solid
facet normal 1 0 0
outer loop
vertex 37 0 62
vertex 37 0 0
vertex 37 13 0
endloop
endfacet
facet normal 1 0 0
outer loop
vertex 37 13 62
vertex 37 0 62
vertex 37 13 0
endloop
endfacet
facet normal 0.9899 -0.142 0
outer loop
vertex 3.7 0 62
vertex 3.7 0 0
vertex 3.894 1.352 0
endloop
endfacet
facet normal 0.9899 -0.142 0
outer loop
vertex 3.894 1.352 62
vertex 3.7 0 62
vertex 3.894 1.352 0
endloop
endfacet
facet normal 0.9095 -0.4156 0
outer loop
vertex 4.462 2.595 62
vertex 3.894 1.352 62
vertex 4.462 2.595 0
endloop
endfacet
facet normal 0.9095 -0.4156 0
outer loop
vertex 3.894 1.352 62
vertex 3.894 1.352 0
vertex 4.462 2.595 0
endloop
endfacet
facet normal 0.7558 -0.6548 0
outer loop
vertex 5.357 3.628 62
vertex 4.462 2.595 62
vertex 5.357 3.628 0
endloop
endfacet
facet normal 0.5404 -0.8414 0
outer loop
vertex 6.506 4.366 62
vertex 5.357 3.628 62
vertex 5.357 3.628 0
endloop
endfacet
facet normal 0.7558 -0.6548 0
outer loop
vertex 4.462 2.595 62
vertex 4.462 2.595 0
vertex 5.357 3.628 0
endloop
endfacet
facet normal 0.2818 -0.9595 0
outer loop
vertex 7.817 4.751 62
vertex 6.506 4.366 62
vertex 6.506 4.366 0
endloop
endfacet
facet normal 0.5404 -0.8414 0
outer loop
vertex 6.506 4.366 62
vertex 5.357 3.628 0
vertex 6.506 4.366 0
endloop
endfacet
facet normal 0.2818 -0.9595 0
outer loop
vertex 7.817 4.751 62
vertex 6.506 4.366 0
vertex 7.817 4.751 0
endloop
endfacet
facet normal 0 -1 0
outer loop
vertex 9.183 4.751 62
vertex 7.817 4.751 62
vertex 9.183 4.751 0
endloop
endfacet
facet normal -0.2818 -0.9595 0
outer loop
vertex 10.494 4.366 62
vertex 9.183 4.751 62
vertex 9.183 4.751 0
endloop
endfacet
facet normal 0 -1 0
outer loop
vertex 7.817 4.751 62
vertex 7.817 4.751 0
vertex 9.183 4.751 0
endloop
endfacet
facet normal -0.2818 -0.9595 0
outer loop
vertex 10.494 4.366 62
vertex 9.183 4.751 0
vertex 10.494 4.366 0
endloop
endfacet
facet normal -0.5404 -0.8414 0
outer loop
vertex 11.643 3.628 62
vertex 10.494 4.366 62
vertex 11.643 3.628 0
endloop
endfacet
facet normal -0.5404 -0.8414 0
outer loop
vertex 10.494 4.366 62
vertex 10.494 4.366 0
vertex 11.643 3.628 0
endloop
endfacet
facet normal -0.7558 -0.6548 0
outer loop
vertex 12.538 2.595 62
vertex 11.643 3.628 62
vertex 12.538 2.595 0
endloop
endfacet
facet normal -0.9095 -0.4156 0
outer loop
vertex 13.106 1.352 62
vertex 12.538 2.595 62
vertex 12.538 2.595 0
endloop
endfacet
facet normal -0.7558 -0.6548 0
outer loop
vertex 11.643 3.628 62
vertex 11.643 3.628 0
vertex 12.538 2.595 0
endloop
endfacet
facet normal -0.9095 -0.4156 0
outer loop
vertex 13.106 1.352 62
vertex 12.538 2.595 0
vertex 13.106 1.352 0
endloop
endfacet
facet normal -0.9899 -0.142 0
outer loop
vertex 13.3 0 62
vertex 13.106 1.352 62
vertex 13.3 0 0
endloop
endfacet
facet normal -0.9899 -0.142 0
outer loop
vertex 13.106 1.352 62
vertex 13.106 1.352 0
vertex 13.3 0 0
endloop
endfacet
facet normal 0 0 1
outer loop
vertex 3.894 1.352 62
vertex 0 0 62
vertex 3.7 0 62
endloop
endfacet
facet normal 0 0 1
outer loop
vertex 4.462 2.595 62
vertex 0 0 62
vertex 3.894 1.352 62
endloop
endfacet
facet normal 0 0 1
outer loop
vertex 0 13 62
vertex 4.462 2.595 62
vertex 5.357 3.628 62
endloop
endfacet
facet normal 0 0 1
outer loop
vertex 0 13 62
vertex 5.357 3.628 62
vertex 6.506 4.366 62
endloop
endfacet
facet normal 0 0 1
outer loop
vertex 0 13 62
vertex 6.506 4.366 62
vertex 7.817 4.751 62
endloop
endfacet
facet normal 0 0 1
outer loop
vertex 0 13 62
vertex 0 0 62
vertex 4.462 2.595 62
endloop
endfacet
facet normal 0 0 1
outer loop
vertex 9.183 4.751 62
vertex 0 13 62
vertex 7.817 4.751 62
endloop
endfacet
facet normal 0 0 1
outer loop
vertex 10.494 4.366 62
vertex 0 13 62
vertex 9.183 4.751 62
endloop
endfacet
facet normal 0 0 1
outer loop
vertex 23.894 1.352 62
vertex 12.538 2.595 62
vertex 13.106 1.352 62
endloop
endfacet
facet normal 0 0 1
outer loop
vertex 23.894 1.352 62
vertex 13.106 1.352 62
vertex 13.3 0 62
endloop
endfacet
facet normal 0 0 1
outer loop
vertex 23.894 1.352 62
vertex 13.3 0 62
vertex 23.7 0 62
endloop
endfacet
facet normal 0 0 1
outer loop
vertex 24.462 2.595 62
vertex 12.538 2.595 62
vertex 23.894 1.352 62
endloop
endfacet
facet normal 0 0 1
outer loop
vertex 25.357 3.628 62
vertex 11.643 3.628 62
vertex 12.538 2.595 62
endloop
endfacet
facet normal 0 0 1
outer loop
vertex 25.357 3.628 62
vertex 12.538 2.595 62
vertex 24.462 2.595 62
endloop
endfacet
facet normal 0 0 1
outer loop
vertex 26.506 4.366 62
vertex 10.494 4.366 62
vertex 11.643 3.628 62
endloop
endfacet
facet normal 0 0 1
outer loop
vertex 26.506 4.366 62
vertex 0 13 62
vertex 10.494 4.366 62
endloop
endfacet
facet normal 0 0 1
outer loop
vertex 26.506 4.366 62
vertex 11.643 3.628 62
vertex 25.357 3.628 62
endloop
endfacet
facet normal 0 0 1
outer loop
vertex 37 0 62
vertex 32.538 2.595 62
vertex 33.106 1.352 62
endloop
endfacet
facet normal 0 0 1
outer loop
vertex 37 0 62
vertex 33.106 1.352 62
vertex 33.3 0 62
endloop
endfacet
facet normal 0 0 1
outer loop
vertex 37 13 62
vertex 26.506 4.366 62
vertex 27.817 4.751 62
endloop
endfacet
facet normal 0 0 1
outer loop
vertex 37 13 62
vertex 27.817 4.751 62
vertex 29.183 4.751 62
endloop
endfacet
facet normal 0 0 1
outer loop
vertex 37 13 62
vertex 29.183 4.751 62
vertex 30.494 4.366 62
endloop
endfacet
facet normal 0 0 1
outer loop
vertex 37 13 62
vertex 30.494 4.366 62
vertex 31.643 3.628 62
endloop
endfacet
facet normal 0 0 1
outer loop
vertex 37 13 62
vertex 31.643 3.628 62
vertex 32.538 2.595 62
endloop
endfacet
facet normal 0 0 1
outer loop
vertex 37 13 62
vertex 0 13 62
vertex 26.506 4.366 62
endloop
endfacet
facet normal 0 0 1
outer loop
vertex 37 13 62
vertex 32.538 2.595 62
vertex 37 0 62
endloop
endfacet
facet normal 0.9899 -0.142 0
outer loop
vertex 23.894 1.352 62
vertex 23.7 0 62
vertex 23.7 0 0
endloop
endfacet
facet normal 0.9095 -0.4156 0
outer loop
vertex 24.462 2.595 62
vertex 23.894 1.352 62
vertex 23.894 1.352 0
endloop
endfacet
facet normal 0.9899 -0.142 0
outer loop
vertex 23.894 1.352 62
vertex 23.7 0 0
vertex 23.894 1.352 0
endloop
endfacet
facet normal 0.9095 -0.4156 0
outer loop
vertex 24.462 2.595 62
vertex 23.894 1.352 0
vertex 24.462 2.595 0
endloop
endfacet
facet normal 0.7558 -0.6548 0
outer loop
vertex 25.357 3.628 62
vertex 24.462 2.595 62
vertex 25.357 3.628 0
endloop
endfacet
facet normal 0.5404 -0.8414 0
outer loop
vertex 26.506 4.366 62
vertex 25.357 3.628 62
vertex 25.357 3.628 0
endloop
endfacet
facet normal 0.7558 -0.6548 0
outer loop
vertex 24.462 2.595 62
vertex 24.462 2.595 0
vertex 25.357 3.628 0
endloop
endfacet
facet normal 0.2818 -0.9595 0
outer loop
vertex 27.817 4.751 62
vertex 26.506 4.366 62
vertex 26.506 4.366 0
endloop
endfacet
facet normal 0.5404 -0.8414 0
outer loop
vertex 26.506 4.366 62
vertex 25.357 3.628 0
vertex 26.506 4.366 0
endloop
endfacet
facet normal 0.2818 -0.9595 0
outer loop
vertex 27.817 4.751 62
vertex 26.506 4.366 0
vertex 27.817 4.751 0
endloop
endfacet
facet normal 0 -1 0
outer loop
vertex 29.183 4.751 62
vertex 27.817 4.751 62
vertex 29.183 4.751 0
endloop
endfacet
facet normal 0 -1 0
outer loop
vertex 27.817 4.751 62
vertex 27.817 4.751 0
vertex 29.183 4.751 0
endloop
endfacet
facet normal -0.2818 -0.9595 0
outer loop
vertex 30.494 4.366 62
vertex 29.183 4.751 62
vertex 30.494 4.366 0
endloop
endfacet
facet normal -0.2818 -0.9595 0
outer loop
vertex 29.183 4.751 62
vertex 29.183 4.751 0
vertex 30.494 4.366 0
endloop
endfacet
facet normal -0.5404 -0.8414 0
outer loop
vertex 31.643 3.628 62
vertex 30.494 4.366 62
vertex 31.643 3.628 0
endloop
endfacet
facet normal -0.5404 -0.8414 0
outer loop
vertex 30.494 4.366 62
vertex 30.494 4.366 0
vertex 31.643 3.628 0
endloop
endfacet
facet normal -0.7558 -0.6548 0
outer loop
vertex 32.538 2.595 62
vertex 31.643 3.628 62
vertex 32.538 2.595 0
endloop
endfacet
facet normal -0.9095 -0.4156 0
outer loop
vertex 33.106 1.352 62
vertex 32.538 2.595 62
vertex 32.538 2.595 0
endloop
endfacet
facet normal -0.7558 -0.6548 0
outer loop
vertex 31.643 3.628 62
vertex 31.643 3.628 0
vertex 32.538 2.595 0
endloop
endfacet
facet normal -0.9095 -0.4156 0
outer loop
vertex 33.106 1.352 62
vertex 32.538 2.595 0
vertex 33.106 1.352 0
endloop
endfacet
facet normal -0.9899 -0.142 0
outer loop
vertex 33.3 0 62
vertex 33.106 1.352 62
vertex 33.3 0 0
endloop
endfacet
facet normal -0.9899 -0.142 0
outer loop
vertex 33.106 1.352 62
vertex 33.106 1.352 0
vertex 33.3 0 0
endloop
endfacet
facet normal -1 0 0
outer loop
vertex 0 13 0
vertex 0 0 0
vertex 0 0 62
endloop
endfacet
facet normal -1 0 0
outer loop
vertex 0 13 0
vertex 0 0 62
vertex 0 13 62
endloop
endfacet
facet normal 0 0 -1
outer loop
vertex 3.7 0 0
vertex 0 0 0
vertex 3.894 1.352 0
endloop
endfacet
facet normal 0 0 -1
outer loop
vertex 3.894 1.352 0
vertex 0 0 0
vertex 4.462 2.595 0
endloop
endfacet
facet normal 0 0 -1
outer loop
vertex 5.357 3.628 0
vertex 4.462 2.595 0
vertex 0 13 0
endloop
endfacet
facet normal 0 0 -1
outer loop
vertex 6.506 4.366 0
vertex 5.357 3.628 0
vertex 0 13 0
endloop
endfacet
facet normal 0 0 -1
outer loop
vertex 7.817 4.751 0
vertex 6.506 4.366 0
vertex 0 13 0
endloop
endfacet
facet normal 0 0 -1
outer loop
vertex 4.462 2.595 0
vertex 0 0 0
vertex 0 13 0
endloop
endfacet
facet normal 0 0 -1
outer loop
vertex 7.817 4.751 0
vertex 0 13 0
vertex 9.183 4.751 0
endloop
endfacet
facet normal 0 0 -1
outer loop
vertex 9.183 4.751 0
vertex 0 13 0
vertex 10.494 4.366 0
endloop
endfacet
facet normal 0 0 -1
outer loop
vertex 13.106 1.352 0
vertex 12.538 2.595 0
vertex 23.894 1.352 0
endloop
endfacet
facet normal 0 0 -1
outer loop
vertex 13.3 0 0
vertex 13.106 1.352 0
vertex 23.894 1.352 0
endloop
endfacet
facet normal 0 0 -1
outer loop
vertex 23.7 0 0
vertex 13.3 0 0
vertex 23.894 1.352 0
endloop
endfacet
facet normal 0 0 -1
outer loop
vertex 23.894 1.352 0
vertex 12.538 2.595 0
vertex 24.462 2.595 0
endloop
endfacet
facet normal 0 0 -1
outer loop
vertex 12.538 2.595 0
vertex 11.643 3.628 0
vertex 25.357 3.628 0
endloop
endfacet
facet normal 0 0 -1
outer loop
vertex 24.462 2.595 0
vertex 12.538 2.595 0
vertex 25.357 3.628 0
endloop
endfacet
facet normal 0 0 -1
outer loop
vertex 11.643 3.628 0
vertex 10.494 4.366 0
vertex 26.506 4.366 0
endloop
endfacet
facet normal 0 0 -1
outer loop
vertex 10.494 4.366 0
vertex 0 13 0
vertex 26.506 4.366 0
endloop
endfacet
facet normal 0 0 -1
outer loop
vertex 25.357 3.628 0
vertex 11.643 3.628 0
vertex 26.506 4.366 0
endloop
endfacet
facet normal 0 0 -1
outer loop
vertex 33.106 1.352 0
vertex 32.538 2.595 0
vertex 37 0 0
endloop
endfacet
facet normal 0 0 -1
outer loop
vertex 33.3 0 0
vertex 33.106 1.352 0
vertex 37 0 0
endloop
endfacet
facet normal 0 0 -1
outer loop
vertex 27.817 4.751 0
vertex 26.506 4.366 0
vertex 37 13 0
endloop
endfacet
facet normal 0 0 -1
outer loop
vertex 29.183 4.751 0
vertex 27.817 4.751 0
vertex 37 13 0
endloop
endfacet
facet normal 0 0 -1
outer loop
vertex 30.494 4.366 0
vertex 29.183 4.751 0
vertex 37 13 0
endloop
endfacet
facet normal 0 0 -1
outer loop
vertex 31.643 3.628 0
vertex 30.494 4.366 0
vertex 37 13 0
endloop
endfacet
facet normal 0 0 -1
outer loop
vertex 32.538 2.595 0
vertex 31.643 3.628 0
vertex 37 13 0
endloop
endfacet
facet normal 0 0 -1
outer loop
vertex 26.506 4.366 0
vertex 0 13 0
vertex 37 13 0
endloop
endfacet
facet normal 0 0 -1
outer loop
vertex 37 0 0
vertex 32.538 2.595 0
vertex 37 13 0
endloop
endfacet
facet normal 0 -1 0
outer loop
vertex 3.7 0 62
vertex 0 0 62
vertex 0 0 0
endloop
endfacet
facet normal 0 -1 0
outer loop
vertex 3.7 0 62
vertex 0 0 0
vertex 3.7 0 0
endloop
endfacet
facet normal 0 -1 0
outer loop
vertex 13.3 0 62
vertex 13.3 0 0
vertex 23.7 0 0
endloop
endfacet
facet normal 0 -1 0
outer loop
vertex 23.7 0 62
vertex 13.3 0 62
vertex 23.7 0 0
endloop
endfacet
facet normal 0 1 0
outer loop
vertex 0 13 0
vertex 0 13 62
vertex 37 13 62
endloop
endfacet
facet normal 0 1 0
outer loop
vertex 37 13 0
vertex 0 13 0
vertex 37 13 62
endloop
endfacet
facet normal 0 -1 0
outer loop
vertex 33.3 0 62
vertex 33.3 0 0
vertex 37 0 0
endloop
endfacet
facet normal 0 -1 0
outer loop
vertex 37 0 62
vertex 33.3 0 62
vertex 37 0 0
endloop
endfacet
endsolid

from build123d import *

# Parameters (mm, degrees)
F0_W     = 37
F0_H     = 15
F1_DEPTH = 62
F3_DEPTH = 62.001
F4_DEPTH = 2


with BuildPart() as f1:
    # F0 (on Top) → F1 (new body)
    with BuildSketch(Plane.XY):
        with Locations((18.5, 7.5)):
            Rectangle(F0_W, F0_H)
    extrude(amount=F1_DEPTH)

    # F2 (on face) → F3 (cut, through all)
    with BuildSketch(Plane(origin=(0, 0, 0), x_dir=(1, 0, 0), z_dir=(0, 0, -1))):
        with BuildLine():
            Line((13.3, 0), (3.7, 0))
            ThreePointArc((3.7, 0), (8.5, -4.8), (13.3, 0))
        make_face()
        with BuildLine():
            Line((33.3, 0), (23.7, 0))
            ThreePointArc((23.7, 0), (28.5, -4.8), (33.3, 0))
        make_face()
    extrude(amount=-F3_DEPTH, mode=Mode.SUBTRACT)

    # F4 (cut): a face of the model
    f4_faces = [f1.faces().sort_by_distance(p)[0] for p in [
        (18.5, 15, 31),
    ]]
    extrude(f4_faces, amount=-F4_DEPTH, mode=Mode.SUBTRACT)


solid = f1.part
